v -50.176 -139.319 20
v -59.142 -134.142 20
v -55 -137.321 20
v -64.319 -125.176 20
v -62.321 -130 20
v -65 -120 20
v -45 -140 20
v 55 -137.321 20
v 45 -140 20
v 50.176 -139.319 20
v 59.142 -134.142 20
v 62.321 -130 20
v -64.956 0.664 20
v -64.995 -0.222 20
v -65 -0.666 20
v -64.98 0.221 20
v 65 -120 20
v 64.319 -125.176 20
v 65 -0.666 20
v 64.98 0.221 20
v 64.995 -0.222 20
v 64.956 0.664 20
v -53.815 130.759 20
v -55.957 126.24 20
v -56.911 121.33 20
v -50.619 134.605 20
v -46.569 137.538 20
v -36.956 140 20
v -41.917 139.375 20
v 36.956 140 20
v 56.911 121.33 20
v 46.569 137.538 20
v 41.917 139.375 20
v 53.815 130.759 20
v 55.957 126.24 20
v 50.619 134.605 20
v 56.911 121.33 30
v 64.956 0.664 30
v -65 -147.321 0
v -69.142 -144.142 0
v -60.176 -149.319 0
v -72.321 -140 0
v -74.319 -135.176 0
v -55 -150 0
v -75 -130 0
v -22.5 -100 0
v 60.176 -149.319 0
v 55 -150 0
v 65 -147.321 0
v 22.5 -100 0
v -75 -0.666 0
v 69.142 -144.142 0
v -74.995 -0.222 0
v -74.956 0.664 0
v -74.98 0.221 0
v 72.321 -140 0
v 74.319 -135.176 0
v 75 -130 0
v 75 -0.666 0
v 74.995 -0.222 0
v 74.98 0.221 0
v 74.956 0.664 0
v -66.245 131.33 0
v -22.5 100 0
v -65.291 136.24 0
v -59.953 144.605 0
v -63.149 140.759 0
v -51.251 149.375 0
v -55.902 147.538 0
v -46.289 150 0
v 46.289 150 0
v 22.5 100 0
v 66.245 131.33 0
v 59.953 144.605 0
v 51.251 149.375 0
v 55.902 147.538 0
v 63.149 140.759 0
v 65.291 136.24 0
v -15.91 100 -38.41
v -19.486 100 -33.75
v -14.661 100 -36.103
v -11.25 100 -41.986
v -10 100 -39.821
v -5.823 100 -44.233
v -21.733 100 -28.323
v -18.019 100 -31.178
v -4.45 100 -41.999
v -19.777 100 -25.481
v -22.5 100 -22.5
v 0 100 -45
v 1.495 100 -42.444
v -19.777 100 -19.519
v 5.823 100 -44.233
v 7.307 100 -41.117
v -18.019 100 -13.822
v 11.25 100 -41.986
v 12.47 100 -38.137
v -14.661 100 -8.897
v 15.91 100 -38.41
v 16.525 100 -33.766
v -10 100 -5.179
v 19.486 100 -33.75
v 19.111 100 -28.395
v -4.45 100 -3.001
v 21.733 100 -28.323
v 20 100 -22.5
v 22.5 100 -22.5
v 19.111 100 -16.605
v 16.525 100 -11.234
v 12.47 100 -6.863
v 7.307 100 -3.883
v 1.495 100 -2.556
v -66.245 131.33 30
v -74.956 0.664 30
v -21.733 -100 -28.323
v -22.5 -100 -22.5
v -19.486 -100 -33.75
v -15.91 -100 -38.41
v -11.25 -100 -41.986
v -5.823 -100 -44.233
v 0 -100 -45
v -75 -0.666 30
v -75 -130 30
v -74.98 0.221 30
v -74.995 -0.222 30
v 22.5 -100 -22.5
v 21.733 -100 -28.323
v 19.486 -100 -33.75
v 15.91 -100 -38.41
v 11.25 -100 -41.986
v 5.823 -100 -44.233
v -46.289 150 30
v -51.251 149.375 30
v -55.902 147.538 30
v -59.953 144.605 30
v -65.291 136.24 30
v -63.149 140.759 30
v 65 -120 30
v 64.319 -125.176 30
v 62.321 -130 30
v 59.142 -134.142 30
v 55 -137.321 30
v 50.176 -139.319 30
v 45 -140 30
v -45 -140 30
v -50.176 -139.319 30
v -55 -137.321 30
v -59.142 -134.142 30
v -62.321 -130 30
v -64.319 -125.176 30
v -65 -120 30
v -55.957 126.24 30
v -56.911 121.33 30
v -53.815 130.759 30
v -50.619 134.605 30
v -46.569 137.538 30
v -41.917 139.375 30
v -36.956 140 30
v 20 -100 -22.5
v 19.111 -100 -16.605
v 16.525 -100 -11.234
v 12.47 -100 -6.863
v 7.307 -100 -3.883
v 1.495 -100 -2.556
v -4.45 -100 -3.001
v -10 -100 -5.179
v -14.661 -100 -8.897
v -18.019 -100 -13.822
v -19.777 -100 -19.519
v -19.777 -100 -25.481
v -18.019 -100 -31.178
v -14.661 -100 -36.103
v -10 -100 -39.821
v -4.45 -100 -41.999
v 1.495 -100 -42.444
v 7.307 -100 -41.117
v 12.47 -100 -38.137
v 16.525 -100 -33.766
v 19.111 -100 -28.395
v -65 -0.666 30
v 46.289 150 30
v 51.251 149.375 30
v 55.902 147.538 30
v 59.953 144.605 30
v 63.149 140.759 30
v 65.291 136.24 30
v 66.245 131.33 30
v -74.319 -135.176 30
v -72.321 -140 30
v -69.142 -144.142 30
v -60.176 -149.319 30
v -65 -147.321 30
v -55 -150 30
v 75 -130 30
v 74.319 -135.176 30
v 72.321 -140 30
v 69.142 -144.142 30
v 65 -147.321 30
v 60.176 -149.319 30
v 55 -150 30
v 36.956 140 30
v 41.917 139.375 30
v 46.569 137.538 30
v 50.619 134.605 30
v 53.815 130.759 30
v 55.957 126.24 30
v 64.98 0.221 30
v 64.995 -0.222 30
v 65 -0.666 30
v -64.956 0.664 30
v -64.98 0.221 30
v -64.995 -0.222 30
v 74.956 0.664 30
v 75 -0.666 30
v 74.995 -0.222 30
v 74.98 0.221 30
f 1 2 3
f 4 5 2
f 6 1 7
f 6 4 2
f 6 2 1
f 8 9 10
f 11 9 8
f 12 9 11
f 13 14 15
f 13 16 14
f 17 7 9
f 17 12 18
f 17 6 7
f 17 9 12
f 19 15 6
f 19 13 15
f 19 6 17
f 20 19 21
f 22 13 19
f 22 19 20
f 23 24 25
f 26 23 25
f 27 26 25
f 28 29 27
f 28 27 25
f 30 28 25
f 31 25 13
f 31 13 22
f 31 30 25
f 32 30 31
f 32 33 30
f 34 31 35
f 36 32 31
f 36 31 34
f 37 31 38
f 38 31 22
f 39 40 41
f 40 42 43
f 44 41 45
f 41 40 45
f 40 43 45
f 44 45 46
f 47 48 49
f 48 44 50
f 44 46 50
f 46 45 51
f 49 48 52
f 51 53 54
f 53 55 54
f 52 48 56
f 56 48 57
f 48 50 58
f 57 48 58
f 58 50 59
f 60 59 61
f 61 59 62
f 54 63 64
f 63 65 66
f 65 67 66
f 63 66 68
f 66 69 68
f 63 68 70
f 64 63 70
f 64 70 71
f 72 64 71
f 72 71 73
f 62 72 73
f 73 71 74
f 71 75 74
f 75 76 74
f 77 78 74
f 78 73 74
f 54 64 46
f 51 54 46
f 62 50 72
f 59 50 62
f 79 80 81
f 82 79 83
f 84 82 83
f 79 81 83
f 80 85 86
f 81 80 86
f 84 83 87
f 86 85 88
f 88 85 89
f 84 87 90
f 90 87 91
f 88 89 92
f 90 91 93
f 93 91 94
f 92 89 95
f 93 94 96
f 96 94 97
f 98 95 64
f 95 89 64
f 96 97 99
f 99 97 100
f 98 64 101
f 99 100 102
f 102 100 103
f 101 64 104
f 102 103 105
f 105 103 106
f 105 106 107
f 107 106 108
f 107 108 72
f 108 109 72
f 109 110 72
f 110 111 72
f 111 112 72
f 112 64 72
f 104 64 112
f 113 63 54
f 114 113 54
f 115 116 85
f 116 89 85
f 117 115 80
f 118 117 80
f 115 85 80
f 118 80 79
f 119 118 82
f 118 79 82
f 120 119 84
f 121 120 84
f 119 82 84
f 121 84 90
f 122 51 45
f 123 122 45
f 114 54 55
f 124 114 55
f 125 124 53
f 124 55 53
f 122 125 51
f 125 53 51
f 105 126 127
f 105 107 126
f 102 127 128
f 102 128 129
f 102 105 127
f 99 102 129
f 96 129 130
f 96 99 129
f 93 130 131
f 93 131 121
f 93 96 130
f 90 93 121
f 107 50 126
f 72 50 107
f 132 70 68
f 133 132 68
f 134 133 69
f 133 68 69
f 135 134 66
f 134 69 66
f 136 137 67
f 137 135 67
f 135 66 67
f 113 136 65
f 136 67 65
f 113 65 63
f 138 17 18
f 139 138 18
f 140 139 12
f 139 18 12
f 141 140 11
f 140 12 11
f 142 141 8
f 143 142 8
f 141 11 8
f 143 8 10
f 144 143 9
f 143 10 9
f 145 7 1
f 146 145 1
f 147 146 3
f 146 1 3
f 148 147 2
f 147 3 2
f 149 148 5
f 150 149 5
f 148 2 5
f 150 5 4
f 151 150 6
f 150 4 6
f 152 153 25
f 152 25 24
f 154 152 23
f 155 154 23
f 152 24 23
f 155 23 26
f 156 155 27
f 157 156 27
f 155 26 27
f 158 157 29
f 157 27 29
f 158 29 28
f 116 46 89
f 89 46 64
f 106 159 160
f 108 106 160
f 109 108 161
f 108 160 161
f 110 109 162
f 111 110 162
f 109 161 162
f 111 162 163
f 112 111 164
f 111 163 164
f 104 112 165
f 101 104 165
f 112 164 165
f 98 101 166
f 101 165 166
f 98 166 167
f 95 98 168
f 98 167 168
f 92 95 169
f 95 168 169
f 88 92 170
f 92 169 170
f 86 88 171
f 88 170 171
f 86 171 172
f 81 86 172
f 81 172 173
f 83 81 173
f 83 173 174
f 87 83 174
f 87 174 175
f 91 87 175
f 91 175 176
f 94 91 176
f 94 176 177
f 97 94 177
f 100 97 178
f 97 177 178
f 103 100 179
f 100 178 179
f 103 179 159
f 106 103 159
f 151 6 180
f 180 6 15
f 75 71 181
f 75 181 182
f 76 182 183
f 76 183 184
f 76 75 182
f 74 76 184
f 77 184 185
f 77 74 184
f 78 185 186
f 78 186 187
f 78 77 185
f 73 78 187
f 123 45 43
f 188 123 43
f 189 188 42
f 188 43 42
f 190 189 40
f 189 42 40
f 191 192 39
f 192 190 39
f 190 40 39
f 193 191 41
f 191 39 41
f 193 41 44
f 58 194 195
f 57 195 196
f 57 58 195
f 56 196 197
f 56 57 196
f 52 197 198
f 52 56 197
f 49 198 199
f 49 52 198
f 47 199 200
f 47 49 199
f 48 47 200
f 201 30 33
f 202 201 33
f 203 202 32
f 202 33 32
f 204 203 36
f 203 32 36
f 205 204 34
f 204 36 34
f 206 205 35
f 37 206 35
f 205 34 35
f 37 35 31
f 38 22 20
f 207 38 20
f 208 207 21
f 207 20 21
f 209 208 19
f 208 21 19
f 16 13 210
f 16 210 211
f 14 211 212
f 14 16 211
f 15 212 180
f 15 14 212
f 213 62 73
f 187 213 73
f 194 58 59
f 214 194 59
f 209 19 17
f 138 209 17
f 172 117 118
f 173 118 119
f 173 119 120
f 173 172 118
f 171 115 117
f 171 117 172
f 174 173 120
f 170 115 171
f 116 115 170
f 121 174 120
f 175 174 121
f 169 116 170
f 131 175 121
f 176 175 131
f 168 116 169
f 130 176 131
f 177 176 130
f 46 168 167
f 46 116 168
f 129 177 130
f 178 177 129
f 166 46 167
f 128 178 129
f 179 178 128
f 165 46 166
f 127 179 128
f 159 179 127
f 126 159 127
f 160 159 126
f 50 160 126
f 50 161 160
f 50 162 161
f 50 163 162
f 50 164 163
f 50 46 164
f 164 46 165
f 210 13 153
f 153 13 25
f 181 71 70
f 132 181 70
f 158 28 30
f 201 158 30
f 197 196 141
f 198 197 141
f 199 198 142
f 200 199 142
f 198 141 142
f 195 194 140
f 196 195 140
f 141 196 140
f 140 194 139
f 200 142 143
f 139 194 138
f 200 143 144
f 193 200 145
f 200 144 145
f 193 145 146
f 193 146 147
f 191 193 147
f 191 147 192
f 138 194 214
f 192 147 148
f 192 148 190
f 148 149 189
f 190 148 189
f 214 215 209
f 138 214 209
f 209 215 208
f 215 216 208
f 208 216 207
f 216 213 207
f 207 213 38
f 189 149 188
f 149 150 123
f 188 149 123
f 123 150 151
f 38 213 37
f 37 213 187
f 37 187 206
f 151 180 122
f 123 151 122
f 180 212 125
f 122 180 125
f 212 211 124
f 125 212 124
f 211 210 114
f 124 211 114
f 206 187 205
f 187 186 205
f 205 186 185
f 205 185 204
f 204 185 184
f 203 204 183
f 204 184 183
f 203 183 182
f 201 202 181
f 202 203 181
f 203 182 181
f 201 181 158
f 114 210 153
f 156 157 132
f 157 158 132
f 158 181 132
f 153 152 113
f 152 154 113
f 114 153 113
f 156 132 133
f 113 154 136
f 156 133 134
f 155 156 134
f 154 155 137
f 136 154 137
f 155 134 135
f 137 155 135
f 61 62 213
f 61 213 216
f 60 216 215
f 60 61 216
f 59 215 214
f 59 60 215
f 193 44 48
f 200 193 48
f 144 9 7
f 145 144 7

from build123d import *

# Parameters (mm, degrees)
F1_DEPTH    = 30
F2_DEPTH    = 20
F3_T1_DEPTH = 10
F3_T3_DEPTH = 11.6648189186
F3_T5_DEPTH = 130
F3_T7_DEPTH = 123.5553091892
F3_T9_DEPTH = 33.3296378373
F5_W        = 45
F5_H        = 200
F6_DEPTH    = 45
F7_R        = 20
F8_DEPTH    = 200
F9_R        = 22.49999


# Not quite as in the source:
# - a fillet or chamfer that OpenCascade refuses, or shapes differently, is made with other operations: its cross-section is extruded or revolved along the edge and cut away or added
# - two fillets or chamfers of one size are made in one step
# - a fillet or chamfer is up to 0.001 mm smaller than in the source, because OpenCascade refuses the exact size


with BuildPart() as f1:
    # F0 (on Top) → F1 (new body)
    with BuildSketch(Plane.XY):
        Polygon((65, 150), (-65, 150), (-75, 0), (-75, -150), (75, -150), (75, 0), align=None)
        Polygon((-65, 0), (-55.6666666667, 140), (55.6666666667, 140), (65, 0), (65, -140), (-65, -140), align=None, mode=Mode.SUBTRACT)
    extrude(amount=F1_DEPTH)

    # F0 (on Top) → F2 (join)
    with BuildSketch(Plane.XY):
        Polygon((55.6666666667, 140), (-55.6666666667, 140), (-65, 0), (-65, -140), (65, -140), (65, 0), align=None)
    extrude(amount=F2_DEPTH)

    # F3: fillet of radius 20 on 12 edges, made by hand

    # F3_s2 → F3_t1 (join)
    with BuildSketch(Plane.XY.offset(20)):
        with BuildLine():
            ThreePointArc((-56.911307986, 121.3303802105), (-50.6192865397, 134.6049238993), (-36.9556048288, 140))
            Line((-36.9556048288, 140), (-55.6666666667, 140))
            Line((-55.6666666667, 140), (-56.911307986, 121.3303802105))
        make_face()
        with BuildLine():
            ThreePointArc((36.9556048288, 140), (50.6192865397, 134.6049238993), (56.911307986, 121.3303802105))
            Line((56.911307986, 121.3303802105), (55.6666666667, 140))
            Line((55.6666666667, 140), (36.9556048288, 140))
        make_face()
        with BuildLine():
            ThreePointArc((65, -120), (59.1421356237, -134.1421356237), (45, -140))
            Line((45, -140), (65, -140))
            Line((65, -140), (65, -120))
        make_face()
        with BuildLine():
            ThreePointArc((-45, -140), (-59.1421356237, -134.1421356237), (-65, -120))
            Line((-65, -120), (-65, -140))
            Line((-65, -140), (-45, -140))
        make_face()
    extrude(amount=F3_T1_DEPTH)

    # F3_s4 → F3_t3 (join)
    with BuildSketch(Plane.XY.offset(18.3351810814)):
        with BuildLine():
            ThreePointArc((-64.9557031571, 0.664452643), (-64.9889227216, -0.0003688333), (-65, -0.6659275675))
            Line((-65, -0.6659275675), (-65, 0))
            Line((-65, 0), (-64.9557031571, 0.664452643))
        make_face()
        with BuildLine():
            ThreePointArc((64.9557031571, 0.664452643), (64.9889227216, -0.0003688333), (65, -0.6659275675))
            Line((65, -0.6659275675), (65, 0))
            Line((65, 0), (64.9557031571, 0.664452643))
        make_face()
    extrude(amount=F3_T3_DEPTH)

    # F3_s6 → F3_t5 (cut)
    with BuildSketch(Plane.XY.offset(-50)):
        with BuildLine():
            ThreePointArc((75, -130), (69.1421356237, -144.1421356237), (55, -150))
            Line((55, -150), (75, -150))
            Line((75, -150), (75, -130))
        make_face()
        with BuildLine():
            ThreePointArc((-75, -130), (-69.1421356237, -144.1421356237), (-55, -150))
            Line((-55, -150), (-75, -150))
            Line((-75, -150), (-75, -130))
        make_face()
    extrude(amount=F3_T5_DEPTH, mode=Mode.SUBTRACT)

    # F3_s8 → F3_t7 (cut)
    with BuildSketch(Plane.XY.offset(-46.7776545946)):
        with BuildLine():
            ThreePointArc((46.2889381622, 150), (59.952619873, 144.6049238993), (66.2446413193, 131.3303802105))
            Line((66.2446413193, 131.3303802105), (65, 150))
            Line((65, 150), (46.2889381622, 150))
        make_face()
        with BuildLine():
            ThreePointArc((-46.2889381622, 150), (-59.952619873, 144.6049238993), (-66.2446413193, 131.3303802105))
            Line((-66.2446413193, 131.3303802105), (-65, 150))
            Line((-65, 150), (-46.2889381622, 150))
        make_face()
    extrude(amount=F3_T7_DEPTH, mode=Mode.SUBTRACT)

    # F3_s10 → F3_t9 (cut)
    with BuildSketch(Plane.XY.offset(-1.6648189186)):
        with BuildLine():
            ThreePointArc((74.9557031571, 0.664452643), (74.9889227216, -0.0003688333), (75, -0.6659275675))
            Line((75, -0.6659275675), (75, 0))
            Line((75, 0), (74.9557031571, 0.664452643))
        make_face()
        with BuildLine():
            ThreePointArc((-74.9557031571, 0.664452643), (-74.9889227216, -0.0003688333), (-75, -0.6659275675))
            Line((-75, -0.6659275675), (-75, 0))
            Line((-75, 0), (-74.9557031571, 0.664452643))
        make_face()
    extrude(amount=F3_T9_DEPTH, mode=Mode.SUBTRACT)

    # F5 (on face) → F6 (join)
    with BuildSketch(Plane.XY):
        Rectangle(F5_W, F5_H)
    extrude(amount=-F6_DEPTH)

    # F7 (on face) → F8 (cut, through all)
    with BuildSketch(Plane.XZ.offset(100)):
        with Locations((0, -22.5)):
            Circle(F7_R)
    extrude(amount=-F8_DEPTH, mode=Mode.SUBTRACT)

    # F9 (radius 22.5 in the source; OpenCascade refuses exactly that, so slightly less here)
    f9_edges = [f1.edges().sort_by_distance(p)[0] for p in [
        (-22.5, 0, -45),
        (22.5, 0, -45),
    ]]
    fillet(f9_edges, radius=F9_R)


solid = f1.part
